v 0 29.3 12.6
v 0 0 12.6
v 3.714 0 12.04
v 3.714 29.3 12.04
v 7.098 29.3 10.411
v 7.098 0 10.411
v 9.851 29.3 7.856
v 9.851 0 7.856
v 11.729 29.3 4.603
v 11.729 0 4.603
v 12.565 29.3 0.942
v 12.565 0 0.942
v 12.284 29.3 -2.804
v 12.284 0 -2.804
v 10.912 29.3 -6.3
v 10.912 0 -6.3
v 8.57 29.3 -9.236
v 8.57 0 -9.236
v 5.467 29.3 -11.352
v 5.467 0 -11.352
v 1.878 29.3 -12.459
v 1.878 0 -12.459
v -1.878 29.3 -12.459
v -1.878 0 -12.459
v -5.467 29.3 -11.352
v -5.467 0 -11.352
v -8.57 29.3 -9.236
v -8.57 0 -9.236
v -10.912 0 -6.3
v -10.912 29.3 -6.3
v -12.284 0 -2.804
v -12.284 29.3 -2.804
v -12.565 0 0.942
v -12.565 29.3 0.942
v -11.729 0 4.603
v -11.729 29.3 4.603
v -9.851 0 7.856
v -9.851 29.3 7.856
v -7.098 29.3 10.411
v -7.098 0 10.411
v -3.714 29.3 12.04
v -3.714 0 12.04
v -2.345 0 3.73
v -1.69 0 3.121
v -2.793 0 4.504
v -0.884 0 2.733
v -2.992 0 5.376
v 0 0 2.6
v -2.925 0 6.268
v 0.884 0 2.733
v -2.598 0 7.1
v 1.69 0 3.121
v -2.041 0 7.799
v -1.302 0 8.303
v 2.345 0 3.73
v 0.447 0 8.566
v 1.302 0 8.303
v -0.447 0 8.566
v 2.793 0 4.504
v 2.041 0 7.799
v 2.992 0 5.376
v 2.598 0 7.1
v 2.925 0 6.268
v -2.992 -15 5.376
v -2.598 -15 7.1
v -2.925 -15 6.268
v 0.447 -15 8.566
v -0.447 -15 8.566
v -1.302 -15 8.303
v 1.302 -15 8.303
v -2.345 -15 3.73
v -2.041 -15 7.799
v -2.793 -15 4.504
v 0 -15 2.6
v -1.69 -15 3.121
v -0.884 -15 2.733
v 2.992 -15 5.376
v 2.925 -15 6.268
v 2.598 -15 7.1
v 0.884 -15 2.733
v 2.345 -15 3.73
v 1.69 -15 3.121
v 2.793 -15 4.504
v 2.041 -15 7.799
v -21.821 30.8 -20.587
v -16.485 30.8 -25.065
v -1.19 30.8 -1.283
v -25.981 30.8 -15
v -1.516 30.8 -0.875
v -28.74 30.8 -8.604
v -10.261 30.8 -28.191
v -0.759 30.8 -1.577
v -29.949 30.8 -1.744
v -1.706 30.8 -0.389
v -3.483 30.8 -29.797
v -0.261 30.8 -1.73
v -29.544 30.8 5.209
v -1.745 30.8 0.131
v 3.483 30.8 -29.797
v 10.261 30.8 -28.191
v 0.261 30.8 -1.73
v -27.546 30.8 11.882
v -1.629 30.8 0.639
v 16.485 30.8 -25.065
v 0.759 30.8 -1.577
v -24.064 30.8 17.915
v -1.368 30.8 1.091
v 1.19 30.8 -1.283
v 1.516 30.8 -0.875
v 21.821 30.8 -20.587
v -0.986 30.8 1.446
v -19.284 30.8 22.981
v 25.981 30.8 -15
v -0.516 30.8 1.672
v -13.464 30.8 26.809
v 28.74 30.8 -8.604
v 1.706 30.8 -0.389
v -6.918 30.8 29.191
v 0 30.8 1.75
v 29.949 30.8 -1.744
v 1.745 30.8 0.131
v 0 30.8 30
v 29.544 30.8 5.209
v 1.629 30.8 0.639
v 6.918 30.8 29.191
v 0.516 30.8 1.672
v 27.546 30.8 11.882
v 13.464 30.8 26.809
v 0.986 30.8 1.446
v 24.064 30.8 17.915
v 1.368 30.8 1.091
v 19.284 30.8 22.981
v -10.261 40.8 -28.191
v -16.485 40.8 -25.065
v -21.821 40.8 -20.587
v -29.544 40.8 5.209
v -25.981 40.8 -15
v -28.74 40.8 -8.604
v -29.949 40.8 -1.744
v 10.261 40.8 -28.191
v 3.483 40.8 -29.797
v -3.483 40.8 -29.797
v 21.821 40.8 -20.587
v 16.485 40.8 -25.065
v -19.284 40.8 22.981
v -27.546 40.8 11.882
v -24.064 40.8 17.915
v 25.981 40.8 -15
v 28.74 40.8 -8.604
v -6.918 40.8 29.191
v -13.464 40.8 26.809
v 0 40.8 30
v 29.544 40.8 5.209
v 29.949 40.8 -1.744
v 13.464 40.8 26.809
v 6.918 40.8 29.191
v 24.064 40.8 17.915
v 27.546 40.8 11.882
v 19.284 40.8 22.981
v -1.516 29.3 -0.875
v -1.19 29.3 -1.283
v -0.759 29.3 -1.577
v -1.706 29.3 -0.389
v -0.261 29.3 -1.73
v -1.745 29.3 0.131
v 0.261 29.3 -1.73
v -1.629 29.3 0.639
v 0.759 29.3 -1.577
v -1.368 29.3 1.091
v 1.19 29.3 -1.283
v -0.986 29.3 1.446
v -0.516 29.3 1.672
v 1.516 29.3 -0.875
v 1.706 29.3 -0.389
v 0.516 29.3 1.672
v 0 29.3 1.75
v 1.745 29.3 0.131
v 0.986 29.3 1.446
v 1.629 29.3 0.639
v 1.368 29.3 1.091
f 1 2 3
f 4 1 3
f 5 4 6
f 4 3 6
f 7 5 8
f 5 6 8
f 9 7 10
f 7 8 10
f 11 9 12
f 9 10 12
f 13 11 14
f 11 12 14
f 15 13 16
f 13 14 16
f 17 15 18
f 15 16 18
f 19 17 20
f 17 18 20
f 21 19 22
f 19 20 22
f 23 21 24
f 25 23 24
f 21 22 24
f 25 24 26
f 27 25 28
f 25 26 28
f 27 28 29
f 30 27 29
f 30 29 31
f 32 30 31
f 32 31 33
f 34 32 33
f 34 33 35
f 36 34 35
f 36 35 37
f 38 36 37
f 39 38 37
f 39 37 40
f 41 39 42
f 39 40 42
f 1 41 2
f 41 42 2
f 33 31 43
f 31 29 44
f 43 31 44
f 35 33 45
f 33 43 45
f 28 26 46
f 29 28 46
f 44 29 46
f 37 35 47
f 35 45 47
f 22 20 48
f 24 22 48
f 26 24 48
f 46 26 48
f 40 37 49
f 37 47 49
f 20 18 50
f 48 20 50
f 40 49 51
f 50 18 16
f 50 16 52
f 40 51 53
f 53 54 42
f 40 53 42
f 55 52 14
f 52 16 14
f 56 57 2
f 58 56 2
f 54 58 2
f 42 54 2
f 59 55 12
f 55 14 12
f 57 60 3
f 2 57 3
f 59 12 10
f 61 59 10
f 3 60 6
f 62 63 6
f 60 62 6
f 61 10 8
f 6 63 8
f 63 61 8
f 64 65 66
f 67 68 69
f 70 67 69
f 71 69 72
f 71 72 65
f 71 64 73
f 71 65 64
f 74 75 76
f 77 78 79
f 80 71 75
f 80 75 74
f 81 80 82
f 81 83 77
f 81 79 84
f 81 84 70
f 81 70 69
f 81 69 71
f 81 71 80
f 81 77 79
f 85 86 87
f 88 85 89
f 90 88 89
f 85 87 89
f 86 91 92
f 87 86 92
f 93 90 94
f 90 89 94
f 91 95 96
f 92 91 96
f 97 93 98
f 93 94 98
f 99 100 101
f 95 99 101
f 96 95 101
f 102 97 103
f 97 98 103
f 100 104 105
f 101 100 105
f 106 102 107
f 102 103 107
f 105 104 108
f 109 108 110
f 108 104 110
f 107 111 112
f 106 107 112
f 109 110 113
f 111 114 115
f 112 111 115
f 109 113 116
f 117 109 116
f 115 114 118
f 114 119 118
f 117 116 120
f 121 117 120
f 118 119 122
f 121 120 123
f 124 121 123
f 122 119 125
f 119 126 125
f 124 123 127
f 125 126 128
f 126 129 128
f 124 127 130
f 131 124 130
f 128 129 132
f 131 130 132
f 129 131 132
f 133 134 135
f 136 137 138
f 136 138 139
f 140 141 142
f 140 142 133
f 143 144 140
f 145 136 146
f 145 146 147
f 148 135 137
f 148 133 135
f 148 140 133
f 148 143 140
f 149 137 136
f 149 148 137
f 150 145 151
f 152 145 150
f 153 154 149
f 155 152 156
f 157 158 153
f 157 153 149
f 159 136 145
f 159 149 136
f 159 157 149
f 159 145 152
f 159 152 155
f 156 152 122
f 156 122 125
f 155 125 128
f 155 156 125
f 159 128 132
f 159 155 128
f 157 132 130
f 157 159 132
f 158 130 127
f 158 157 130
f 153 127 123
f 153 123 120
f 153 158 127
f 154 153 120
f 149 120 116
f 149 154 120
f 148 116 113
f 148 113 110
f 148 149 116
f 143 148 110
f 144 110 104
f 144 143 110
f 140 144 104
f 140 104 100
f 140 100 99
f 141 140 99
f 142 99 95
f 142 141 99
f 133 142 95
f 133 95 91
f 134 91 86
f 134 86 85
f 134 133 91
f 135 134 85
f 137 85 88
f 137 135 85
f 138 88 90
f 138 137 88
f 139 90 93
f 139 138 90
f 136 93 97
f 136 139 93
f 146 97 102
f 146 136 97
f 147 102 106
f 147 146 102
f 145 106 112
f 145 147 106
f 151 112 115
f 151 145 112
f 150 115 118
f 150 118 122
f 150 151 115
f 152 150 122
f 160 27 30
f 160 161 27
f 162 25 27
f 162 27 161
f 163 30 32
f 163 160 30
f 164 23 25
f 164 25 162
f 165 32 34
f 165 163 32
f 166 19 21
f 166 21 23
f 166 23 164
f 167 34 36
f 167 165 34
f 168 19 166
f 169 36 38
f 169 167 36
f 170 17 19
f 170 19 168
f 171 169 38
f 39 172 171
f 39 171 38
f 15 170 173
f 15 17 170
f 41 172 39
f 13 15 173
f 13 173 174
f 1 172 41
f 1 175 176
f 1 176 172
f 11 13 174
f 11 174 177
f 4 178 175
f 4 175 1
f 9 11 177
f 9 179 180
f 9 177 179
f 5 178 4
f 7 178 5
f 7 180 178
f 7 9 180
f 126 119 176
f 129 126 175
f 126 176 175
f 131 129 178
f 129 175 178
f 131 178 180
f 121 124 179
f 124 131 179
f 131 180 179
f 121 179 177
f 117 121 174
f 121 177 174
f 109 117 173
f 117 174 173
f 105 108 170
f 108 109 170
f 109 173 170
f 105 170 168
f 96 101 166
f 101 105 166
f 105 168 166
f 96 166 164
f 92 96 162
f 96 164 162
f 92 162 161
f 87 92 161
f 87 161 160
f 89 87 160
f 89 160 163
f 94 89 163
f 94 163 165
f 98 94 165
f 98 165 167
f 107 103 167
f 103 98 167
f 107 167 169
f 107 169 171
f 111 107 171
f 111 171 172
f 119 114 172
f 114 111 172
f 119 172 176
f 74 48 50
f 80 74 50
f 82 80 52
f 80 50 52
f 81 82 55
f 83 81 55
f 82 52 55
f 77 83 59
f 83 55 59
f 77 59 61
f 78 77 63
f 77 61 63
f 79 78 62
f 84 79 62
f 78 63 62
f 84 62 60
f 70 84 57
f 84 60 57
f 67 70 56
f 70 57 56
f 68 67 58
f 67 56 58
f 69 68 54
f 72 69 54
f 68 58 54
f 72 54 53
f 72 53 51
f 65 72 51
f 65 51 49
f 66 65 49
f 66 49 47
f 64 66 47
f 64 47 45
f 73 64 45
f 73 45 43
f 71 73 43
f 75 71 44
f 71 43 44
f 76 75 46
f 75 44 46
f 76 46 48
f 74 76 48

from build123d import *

# Parameters (mm, degrees)
SKETCH1_R           = 12.6
BOSS_EXTRUDE1_DEPTH = 29.3
SKETCH2_R           = 1.75
BOSS_EXTRUDE2_DEPTH = 11.5
SKETCH3_R           = 30
BOSS_EXTRUDE3_DEPTH = 10
SKETCH4_R           = 3
BOSS_EXTRUDE4_DEPTH = 15


with BuildPart() as part:
    # Sketch1 → Boss-Extrude1 (new body)
    with BuildSketch(Plane(origin=(0, 0, 0), x_dir=(1, 0, 0), z_dir=(0, 1, 0))):
        with Locations(Location((0, 0, 0), (0, 0, 270))):
            Circle(SKETCH1_R)
    extrude(amount=BOSS_EXTRUDE1_DEPTH)

    # Sketch2 → Boss-Extrude2 (add)
    with BuildSketch(Plane(origin=(0, 29.3, 0), x_dir=(1, 0, 0), z_dir=(0, 1, 0))):
        with Locations(Location((0, 0, 0), (0, 0, 270))):
            Circle(SKETCH2_R)
    extrude(amount=BOSS_EXTRUDE2_DEPTH)

    # Sketch3 → Boss-Extrude3 (add)
    with BuildSketch(Plane(origin=(0, 40.8, 0), x_dir=(1, 0, 0), z_dir=(0, 1, 0))):
        with Locations(Location((0, 0, 0), (0, 0, 270))):
            Circle(SKETCH3_R)
    extrude(amount=-BOSS_EXTRUDE3_DEPTH)

    # Sketch4 → Boss-Extrude4 (add)
    with BuildSketch(Plane.XZ):
        with Locations(Location((0, 5.6, 0), (0, 0, 270))):
            Circle(SKETCH4_R)
    extrude(amount=BOSS_EXTRUDE4_DEPTH)


solid = part.part
